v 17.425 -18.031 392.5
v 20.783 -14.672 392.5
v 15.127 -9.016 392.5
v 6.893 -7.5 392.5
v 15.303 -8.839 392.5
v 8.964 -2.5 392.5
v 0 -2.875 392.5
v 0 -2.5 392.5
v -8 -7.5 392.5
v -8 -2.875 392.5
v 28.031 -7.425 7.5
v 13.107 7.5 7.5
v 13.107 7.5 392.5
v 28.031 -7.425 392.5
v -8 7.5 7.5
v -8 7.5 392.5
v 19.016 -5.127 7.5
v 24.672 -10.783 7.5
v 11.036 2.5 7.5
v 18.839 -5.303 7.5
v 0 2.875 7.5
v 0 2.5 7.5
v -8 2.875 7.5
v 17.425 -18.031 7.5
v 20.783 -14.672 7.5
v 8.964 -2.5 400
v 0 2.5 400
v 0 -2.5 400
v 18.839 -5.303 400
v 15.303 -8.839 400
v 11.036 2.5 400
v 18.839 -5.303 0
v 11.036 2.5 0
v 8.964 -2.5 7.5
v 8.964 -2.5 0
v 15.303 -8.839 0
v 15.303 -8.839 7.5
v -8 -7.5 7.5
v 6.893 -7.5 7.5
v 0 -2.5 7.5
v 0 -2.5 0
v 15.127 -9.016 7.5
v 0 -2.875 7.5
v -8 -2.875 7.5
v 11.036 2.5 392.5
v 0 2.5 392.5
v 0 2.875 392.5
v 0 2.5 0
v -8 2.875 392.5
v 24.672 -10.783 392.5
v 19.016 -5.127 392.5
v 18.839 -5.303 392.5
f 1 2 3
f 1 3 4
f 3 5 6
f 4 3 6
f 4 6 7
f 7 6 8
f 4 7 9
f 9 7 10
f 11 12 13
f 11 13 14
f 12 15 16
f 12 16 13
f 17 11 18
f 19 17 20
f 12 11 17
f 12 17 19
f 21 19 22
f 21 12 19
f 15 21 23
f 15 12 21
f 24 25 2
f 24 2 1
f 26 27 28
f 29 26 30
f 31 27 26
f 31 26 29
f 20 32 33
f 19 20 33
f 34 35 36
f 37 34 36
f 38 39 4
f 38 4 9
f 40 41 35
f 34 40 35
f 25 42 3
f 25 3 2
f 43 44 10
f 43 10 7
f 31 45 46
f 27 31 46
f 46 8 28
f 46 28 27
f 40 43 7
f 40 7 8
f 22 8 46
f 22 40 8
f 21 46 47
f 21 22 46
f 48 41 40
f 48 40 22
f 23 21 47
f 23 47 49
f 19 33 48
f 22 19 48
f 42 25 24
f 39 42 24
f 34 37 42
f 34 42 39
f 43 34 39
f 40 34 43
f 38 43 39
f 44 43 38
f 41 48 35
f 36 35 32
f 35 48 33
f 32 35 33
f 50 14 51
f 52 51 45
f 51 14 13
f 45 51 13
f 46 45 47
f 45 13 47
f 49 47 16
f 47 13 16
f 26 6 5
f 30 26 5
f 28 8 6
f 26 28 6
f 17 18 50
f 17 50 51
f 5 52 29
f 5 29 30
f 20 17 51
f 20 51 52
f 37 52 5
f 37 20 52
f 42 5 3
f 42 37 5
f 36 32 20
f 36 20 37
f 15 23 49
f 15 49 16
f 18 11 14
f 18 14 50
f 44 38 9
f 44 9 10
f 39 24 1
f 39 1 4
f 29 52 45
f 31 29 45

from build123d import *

# Parameters (mm, degrees)
BOSS_EXTRUDE1_DEPTH = 7.5
BOSS_EXTRUDE2_DEPTH = 385
BOSS_EXTRUDE3_DEPTH = 7.5


with BuildPart() as part:
    # Sketch1 → Boss-Extrude1 (new body)
    with BuildSketch(Plane.XY):
        Polygon((0, -2.5), (8.964466094, -2.5), (15.303300859, -8.838834765), (18.838834765, -5.303300859), (11.035533906, 2.5), (0, 2.5), align=None)
    extrude(amount=BOSS_EXTRUDE1_DEPTH)

    # Sketch2 → Boss-Extrude2 (add)
    with BuildSketch(Plane.XY.offset(7.5)):
        Polygon((15.126524164, -9.01561146), (20.783378413, -14.67246571), (17.424621202, -18.03122292), (6.893398282, -7.5), (-8, -7.5), (-8, -2.875), (0, -2.875), (0, 2.875), (-8, 2.875), (-8, 7.5), (13.106601718, 7.5), (28.03122292, -7.424621202), (24.67246571, -10.783378413), (19.01561146, -5.126524164), align=None)
    extrude(amount=BOSS_EXTRUDE2_DEPTH)

    # Sketch4 → Boss-Extrude3 (add)
    with BuildSketch(Plane.XY.offset(392.5)):
        Polygon((15.303300859, -8.838834765), (18.838834765, -5.303300859), (11.035533906, 2.5), (0, 2.5), (0, -2.5), (8.964466094, -2.5), align=None)
    extrude(amount=BOSS_EXTRUDE3_DEPTH)


solid = part.part
